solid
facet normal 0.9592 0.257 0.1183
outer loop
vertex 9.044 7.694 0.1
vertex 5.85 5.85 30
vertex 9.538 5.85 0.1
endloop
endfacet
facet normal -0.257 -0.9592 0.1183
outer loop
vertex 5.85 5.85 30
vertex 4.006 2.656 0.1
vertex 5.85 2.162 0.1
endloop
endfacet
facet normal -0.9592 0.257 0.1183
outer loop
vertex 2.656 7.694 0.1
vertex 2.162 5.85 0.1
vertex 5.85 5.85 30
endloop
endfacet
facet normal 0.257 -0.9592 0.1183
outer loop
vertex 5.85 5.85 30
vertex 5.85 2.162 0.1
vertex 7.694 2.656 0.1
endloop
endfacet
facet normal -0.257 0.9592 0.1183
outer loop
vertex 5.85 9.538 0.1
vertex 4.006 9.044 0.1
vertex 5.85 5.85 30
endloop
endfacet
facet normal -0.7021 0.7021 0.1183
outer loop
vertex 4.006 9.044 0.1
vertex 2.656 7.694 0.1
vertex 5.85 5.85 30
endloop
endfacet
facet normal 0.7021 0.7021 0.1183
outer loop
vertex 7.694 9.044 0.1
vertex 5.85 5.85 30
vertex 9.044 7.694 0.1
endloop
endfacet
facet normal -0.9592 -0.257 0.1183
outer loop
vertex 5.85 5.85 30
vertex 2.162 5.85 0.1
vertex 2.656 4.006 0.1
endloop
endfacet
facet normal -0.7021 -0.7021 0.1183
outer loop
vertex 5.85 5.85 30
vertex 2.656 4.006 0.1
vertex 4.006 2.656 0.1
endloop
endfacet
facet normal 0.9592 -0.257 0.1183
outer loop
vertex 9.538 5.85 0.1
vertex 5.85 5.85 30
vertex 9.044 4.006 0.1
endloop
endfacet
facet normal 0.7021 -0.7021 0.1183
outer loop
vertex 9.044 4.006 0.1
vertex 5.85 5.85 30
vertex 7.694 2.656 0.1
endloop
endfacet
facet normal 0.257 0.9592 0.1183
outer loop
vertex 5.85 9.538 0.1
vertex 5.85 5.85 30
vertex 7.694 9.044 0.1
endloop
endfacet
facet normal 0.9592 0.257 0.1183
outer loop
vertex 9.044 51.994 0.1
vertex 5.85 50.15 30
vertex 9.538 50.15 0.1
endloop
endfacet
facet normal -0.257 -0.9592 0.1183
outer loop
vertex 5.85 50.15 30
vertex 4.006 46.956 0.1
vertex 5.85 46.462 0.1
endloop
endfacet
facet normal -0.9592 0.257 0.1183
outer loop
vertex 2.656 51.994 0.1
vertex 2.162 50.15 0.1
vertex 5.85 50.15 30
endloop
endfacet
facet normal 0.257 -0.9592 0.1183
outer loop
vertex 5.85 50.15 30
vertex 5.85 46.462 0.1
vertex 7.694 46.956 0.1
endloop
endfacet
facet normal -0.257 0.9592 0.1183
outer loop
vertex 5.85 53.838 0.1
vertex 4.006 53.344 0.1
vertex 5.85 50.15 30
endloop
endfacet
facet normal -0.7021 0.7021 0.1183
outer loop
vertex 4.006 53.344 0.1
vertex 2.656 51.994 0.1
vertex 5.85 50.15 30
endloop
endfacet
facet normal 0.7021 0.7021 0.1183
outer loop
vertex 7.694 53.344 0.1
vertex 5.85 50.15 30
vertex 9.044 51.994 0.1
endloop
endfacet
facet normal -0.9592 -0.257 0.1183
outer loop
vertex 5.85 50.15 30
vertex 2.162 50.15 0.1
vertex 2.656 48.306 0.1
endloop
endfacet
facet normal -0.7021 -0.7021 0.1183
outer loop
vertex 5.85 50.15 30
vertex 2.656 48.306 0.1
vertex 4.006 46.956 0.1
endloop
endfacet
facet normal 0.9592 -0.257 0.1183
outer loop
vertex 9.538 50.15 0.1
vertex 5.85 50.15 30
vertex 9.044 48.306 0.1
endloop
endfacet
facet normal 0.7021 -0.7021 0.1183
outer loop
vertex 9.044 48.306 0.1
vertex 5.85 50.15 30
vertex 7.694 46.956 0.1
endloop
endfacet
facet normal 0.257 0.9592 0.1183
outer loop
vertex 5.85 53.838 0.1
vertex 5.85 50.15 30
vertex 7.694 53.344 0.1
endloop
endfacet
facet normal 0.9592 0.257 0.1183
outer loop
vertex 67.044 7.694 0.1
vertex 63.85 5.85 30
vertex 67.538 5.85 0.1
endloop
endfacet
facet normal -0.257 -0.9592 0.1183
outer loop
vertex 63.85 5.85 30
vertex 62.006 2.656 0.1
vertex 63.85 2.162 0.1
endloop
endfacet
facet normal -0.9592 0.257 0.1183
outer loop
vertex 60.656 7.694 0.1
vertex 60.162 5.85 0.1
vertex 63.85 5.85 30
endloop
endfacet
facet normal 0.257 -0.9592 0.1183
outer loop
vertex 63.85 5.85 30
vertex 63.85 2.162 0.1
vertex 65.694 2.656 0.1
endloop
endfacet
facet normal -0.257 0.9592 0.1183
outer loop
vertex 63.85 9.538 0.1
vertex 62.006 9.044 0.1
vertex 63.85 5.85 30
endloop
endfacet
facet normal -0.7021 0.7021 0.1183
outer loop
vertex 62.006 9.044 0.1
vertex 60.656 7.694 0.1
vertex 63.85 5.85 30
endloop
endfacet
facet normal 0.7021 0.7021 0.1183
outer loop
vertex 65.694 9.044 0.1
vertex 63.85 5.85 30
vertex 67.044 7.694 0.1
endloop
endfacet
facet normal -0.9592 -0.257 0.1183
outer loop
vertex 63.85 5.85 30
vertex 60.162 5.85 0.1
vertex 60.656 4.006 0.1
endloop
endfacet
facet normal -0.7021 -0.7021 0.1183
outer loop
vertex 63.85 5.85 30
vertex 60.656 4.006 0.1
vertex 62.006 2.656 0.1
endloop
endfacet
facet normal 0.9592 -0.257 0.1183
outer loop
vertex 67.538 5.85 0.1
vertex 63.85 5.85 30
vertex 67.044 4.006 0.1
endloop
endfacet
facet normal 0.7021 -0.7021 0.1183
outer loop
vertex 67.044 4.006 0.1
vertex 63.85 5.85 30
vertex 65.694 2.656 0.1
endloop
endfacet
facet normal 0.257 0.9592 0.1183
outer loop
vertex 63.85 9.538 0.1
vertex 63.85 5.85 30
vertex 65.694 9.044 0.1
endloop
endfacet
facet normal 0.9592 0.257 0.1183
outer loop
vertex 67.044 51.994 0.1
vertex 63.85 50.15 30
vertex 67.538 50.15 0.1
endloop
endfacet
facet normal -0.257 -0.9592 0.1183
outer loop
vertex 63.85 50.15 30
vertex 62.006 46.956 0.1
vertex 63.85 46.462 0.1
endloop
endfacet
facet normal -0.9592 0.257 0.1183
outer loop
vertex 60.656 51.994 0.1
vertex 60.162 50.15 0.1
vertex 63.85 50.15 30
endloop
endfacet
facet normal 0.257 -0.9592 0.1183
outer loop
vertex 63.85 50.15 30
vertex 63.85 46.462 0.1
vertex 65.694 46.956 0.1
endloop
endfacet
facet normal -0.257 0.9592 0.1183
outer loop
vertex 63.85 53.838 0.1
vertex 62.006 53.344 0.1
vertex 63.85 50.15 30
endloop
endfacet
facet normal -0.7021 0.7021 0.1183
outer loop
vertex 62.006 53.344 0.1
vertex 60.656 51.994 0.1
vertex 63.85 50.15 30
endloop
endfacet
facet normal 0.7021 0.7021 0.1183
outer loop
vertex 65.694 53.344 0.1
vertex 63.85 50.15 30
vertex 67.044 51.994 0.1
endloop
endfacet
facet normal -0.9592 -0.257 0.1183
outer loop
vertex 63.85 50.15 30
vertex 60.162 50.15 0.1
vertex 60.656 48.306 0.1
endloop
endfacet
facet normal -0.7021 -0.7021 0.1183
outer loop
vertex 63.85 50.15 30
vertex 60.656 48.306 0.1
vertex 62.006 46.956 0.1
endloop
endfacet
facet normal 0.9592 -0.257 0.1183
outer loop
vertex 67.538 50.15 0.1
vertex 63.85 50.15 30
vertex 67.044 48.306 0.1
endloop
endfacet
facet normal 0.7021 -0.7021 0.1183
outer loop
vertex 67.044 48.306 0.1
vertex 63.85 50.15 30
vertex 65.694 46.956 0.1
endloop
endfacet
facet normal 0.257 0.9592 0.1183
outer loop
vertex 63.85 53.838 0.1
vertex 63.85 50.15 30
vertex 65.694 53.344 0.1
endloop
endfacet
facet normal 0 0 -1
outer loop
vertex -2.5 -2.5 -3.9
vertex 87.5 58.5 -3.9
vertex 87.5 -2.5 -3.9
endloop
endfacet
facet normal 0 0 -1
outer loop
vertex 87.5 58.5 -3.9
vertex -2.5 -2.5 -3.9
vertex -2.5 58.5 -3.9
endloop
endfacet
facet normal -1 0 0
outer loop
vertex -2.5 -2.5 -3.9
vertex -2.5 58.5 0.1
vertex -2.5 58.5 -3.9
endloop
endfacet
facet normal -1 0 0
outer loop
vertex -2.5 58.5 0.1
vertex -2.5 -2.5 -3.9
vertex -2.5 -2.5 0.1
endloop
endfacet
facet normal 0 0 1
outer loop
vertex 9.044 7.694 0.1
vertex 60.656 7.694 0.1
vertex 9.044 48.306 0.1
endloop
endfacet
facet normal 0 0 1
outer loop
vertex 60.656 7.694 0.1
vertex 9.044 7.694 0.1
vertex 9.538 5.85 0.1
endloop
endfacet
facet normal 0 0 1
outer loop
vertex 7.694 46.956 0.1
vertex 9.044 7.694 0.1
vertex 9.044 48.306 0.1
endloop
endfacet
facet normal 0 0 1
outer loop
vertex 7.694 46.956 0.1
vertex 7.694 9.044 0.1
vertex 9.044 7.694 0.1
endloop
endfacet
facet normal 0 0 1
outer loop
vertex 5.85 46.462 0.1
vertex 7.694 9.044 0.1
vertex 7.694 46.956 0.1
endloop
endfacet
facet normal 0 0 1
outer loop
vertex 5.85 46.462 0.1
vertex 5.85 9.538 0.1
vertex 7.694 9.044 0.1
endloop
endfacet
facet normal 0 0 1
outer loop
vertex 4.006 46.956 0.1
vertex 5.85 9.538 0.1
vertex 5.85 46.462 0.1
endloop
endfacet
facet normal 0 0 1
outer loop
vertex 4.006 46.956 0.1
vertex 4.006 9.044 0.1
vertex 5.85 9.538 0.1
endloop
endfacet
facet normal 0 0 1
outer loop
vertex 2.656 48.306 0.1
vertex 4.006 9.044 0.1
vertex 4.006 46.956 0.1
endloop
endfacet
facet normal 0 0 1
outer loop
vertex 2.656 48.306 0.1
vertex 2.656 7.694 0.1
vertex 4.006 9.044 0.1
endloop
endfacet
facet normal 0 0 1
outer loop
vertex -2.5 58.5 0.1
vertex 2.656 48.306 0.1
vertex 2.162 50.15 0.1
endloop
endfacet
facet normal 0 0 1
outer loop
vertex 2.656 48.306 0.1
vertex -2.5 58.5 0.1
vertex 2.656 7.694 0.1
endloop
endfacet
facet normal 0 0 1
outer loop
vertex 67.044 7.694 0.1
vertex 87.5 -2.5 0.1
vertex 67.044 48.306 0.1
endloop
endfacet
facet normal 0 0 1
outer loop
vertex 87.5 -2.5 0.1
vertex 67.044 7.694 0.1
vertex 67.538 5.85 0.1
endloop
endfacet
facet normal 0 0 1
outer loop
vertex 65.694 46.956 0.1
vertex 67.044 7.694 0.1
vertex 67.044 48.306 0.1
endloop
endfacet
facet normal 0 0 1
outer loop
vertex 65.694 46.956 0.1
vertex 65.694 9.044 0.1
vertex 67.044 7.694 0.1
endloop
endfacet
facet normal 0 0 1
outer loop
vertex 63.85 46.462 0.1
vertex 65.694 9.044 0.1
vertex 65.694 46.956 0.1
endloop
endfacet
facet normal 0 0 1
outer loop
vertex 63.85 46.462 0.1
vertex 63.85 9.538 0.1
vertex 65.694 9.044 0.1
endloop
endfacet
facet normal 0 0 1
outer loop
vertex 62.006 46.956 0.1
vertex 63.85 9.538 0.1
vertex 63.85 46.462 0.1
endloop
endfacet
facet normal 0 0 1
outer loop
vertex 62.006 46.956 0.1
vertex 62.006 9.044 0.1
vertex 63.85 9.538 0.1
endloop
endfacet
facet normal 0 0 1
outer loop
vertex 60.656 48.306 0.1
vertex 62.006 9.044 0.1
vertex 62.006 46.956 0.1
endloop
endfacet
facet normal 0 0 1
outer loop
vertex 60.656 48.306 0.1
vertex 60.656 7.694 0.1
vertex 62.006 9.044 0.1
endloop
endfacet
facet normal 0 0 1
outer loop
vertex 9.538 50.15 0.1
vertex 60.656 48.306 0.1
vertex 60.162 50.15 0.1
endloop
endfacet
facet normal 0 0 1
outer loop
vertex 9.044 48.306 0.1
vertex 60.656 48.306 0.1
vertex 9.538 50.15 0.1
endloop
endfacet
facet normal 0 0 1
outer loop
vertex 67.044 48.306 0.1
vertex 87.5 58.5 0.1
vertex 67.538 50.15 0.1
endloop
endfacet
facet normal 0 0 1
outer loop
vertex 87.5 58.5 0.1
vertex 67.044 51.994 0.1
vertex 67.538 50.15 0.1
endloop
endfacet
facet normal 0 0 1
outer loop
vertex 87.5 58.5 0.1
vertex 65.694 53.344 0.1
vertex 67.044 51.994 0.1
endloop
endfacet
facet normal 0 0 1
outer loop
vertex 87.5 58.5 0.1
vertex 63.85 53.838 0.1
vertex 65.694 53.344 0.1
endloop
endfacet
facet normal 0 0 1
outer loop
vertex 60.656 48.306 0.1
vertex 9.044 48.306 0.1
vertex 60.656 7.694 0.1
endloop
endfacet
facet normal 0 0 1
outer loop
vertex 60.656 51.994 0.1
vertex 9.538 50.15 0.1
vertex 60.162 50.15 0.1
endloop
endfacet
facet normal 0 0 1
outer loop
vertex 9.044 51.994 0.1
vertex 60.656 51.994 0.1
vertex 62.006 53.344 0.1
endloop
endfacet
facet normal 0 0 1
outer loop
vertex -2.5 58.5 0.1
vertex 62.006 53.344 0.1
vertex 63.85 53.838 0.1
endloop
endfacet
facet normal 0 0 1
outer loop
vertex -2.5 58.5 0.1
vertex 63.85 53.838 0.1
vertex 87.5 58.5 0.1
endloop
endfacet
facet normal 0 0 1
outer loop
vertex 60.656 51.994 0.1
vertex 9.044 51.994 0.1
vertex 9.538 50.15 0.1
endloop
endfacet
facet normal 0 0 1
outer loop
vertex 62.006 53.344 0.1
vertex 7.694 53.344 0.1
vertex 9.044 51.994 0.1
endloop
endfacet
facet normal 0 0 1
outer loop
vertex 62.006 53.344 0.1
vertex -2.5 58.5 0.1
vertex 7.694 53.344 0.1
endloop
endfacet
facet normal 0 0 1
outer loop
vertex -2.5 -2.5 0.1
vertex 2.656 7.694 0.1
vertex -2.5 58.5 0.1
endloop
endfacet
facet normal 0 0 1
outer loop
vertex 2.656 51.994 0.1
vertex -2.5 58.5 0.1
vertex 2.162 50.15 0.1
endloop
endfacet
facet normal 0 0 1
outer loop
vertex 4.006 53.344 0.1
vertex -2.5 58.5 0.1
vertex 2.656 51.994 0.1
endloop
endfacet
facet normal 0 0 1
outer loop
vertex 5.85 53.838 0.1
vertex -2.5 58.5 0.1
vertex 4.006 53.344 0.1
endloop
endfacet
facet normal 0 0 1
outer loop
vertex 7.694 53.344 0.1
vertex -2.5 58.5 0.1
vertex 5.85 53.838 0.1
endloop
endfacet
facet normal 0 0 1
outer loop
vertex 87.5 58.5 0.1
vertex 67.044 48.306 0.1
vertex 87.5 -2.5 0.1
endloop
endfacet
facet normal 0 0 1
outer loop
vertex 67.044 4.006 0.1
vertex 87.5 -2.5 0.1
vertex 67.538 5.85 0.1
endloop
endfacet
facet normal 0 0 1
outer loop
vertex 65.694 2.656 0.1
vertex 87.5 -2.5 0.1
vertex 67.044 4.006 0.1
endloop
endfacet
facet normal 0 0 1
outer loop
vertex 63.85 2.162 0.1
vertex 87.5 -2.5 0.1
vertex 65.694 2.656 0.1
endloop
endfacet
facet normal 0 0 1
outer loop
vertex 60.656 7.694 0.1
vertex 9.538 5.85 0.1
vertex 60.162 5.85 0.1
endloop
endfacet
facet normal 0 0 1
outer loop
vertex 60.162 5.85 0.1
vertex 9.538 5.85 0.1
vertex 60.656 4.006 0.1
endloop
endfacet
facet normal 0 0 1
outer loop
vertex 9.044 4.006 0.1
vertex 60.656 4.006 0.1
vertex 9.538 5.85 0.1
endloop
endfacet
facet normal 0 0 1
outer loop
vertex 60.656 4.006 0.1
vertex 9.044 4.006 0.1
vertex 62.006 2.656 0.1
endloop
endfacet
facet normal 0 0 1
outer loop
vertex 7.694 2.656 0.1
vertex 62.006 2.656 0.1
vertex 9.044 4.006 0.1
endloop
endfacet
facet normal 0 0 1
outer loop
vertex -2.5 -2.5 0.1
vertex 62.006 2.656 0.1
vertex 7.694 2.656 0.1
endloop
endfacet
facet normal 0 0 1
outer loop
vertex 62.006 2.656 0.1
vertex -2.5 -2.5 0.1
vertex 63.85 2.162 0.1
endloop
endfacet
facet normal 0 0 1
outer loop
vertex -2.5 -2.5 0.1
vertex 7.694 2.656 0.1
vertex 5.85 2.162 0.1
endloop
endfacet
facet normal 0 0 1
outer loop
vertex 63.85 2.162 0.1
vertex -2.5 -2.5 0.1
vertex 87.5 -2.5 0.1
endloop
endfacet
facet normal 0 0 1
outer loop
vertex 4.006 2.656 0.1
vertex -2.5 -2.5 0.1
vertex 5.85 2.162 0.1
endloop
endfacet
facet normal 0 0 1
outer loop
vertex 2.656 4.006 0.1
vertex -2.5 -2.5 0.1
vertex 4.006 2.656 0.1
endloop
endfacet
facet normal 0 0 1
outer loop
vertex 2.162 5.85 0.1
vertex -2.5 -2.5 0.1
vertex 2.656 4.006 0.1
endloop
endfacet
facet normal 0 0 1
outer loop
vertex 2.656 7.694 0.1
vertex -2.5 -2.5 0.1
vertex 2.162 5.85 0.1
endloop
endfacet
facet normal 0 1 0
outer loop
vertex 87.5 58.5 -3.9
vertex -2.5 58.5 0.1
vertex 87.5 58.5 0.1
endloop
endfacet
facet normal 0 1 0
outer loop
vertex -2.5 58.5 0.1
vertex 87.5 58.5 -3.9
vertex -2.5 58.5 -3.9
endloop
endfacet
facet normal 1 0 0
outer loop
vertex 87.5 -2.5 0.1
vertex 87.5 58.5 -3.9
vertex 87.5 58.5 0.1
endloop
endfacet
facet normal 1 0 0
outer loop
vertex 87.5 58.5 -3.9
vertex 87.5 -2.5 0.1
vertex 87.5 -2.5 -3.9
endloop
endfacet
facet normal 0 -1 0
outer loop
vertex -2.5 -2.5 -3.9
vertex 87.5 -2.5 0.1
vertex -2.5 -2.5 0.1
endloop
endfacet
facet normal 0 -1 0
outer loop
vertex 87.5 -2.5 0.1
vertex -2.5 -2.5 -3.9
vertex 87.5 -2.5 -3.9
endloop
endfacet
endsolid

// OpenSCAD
BOARD_WIDTH = 85;
BOARD_DEPTH = 56;
BOARD_HEIGHT = 30;
HOLE_DIAMETER = 2.7;
HOLE_DISTANCE_FROM_VERTEX = 2.15;
SPACE_WIDTH_BETWEEN_HOLES = 58;
BIG_OFFSET = 5;

ENCLOSURE_LAYER = 4;
HOLDER_BASE = HOLE_DIAMETER + 1;

module main(){
  board_base_with_holders();
}

module board_base_with_holders(){
  translate([0,0,-ENCLOSURE_LAYER + 0.1])
  board_base();

  holders_pair();

  translate([SPACE_WIDTH_BETWEEN_HOLES, 0, 0])
  holders_pair();  
  
  
}

module holders_pair(){
  translate([HOLE_DISTANCE_FROM_VERTEX + HOLDER_BASE, HOLE_DISTANCE_FROM_VERTEX + HOLDER_BASE, 0])
  board_holder();

  translate([HOLE_DISTANCE_FROM_VERTEX + HOLDER_BASE, BOARD_DEPTH - (HOLE_DISTANCE_FROM_VERTEX + HOLDER_BASE), 0])
  board_holder();  
}

module board_base(){
  linear_extrude(ENCLOSURE_LAYER)
    translate([-BIG_OFFSET/2, -BIG_OFFSET/2])
  square([BOARD_WIDTH + BIG_OFFSET, BOARD_DEPTH + BIG_OFFSET]);
}

module board_holder(){
  cylinder(r1=HOLDER_BASE, r2=0, h=BOARD_HEIGHT);
}

main();
